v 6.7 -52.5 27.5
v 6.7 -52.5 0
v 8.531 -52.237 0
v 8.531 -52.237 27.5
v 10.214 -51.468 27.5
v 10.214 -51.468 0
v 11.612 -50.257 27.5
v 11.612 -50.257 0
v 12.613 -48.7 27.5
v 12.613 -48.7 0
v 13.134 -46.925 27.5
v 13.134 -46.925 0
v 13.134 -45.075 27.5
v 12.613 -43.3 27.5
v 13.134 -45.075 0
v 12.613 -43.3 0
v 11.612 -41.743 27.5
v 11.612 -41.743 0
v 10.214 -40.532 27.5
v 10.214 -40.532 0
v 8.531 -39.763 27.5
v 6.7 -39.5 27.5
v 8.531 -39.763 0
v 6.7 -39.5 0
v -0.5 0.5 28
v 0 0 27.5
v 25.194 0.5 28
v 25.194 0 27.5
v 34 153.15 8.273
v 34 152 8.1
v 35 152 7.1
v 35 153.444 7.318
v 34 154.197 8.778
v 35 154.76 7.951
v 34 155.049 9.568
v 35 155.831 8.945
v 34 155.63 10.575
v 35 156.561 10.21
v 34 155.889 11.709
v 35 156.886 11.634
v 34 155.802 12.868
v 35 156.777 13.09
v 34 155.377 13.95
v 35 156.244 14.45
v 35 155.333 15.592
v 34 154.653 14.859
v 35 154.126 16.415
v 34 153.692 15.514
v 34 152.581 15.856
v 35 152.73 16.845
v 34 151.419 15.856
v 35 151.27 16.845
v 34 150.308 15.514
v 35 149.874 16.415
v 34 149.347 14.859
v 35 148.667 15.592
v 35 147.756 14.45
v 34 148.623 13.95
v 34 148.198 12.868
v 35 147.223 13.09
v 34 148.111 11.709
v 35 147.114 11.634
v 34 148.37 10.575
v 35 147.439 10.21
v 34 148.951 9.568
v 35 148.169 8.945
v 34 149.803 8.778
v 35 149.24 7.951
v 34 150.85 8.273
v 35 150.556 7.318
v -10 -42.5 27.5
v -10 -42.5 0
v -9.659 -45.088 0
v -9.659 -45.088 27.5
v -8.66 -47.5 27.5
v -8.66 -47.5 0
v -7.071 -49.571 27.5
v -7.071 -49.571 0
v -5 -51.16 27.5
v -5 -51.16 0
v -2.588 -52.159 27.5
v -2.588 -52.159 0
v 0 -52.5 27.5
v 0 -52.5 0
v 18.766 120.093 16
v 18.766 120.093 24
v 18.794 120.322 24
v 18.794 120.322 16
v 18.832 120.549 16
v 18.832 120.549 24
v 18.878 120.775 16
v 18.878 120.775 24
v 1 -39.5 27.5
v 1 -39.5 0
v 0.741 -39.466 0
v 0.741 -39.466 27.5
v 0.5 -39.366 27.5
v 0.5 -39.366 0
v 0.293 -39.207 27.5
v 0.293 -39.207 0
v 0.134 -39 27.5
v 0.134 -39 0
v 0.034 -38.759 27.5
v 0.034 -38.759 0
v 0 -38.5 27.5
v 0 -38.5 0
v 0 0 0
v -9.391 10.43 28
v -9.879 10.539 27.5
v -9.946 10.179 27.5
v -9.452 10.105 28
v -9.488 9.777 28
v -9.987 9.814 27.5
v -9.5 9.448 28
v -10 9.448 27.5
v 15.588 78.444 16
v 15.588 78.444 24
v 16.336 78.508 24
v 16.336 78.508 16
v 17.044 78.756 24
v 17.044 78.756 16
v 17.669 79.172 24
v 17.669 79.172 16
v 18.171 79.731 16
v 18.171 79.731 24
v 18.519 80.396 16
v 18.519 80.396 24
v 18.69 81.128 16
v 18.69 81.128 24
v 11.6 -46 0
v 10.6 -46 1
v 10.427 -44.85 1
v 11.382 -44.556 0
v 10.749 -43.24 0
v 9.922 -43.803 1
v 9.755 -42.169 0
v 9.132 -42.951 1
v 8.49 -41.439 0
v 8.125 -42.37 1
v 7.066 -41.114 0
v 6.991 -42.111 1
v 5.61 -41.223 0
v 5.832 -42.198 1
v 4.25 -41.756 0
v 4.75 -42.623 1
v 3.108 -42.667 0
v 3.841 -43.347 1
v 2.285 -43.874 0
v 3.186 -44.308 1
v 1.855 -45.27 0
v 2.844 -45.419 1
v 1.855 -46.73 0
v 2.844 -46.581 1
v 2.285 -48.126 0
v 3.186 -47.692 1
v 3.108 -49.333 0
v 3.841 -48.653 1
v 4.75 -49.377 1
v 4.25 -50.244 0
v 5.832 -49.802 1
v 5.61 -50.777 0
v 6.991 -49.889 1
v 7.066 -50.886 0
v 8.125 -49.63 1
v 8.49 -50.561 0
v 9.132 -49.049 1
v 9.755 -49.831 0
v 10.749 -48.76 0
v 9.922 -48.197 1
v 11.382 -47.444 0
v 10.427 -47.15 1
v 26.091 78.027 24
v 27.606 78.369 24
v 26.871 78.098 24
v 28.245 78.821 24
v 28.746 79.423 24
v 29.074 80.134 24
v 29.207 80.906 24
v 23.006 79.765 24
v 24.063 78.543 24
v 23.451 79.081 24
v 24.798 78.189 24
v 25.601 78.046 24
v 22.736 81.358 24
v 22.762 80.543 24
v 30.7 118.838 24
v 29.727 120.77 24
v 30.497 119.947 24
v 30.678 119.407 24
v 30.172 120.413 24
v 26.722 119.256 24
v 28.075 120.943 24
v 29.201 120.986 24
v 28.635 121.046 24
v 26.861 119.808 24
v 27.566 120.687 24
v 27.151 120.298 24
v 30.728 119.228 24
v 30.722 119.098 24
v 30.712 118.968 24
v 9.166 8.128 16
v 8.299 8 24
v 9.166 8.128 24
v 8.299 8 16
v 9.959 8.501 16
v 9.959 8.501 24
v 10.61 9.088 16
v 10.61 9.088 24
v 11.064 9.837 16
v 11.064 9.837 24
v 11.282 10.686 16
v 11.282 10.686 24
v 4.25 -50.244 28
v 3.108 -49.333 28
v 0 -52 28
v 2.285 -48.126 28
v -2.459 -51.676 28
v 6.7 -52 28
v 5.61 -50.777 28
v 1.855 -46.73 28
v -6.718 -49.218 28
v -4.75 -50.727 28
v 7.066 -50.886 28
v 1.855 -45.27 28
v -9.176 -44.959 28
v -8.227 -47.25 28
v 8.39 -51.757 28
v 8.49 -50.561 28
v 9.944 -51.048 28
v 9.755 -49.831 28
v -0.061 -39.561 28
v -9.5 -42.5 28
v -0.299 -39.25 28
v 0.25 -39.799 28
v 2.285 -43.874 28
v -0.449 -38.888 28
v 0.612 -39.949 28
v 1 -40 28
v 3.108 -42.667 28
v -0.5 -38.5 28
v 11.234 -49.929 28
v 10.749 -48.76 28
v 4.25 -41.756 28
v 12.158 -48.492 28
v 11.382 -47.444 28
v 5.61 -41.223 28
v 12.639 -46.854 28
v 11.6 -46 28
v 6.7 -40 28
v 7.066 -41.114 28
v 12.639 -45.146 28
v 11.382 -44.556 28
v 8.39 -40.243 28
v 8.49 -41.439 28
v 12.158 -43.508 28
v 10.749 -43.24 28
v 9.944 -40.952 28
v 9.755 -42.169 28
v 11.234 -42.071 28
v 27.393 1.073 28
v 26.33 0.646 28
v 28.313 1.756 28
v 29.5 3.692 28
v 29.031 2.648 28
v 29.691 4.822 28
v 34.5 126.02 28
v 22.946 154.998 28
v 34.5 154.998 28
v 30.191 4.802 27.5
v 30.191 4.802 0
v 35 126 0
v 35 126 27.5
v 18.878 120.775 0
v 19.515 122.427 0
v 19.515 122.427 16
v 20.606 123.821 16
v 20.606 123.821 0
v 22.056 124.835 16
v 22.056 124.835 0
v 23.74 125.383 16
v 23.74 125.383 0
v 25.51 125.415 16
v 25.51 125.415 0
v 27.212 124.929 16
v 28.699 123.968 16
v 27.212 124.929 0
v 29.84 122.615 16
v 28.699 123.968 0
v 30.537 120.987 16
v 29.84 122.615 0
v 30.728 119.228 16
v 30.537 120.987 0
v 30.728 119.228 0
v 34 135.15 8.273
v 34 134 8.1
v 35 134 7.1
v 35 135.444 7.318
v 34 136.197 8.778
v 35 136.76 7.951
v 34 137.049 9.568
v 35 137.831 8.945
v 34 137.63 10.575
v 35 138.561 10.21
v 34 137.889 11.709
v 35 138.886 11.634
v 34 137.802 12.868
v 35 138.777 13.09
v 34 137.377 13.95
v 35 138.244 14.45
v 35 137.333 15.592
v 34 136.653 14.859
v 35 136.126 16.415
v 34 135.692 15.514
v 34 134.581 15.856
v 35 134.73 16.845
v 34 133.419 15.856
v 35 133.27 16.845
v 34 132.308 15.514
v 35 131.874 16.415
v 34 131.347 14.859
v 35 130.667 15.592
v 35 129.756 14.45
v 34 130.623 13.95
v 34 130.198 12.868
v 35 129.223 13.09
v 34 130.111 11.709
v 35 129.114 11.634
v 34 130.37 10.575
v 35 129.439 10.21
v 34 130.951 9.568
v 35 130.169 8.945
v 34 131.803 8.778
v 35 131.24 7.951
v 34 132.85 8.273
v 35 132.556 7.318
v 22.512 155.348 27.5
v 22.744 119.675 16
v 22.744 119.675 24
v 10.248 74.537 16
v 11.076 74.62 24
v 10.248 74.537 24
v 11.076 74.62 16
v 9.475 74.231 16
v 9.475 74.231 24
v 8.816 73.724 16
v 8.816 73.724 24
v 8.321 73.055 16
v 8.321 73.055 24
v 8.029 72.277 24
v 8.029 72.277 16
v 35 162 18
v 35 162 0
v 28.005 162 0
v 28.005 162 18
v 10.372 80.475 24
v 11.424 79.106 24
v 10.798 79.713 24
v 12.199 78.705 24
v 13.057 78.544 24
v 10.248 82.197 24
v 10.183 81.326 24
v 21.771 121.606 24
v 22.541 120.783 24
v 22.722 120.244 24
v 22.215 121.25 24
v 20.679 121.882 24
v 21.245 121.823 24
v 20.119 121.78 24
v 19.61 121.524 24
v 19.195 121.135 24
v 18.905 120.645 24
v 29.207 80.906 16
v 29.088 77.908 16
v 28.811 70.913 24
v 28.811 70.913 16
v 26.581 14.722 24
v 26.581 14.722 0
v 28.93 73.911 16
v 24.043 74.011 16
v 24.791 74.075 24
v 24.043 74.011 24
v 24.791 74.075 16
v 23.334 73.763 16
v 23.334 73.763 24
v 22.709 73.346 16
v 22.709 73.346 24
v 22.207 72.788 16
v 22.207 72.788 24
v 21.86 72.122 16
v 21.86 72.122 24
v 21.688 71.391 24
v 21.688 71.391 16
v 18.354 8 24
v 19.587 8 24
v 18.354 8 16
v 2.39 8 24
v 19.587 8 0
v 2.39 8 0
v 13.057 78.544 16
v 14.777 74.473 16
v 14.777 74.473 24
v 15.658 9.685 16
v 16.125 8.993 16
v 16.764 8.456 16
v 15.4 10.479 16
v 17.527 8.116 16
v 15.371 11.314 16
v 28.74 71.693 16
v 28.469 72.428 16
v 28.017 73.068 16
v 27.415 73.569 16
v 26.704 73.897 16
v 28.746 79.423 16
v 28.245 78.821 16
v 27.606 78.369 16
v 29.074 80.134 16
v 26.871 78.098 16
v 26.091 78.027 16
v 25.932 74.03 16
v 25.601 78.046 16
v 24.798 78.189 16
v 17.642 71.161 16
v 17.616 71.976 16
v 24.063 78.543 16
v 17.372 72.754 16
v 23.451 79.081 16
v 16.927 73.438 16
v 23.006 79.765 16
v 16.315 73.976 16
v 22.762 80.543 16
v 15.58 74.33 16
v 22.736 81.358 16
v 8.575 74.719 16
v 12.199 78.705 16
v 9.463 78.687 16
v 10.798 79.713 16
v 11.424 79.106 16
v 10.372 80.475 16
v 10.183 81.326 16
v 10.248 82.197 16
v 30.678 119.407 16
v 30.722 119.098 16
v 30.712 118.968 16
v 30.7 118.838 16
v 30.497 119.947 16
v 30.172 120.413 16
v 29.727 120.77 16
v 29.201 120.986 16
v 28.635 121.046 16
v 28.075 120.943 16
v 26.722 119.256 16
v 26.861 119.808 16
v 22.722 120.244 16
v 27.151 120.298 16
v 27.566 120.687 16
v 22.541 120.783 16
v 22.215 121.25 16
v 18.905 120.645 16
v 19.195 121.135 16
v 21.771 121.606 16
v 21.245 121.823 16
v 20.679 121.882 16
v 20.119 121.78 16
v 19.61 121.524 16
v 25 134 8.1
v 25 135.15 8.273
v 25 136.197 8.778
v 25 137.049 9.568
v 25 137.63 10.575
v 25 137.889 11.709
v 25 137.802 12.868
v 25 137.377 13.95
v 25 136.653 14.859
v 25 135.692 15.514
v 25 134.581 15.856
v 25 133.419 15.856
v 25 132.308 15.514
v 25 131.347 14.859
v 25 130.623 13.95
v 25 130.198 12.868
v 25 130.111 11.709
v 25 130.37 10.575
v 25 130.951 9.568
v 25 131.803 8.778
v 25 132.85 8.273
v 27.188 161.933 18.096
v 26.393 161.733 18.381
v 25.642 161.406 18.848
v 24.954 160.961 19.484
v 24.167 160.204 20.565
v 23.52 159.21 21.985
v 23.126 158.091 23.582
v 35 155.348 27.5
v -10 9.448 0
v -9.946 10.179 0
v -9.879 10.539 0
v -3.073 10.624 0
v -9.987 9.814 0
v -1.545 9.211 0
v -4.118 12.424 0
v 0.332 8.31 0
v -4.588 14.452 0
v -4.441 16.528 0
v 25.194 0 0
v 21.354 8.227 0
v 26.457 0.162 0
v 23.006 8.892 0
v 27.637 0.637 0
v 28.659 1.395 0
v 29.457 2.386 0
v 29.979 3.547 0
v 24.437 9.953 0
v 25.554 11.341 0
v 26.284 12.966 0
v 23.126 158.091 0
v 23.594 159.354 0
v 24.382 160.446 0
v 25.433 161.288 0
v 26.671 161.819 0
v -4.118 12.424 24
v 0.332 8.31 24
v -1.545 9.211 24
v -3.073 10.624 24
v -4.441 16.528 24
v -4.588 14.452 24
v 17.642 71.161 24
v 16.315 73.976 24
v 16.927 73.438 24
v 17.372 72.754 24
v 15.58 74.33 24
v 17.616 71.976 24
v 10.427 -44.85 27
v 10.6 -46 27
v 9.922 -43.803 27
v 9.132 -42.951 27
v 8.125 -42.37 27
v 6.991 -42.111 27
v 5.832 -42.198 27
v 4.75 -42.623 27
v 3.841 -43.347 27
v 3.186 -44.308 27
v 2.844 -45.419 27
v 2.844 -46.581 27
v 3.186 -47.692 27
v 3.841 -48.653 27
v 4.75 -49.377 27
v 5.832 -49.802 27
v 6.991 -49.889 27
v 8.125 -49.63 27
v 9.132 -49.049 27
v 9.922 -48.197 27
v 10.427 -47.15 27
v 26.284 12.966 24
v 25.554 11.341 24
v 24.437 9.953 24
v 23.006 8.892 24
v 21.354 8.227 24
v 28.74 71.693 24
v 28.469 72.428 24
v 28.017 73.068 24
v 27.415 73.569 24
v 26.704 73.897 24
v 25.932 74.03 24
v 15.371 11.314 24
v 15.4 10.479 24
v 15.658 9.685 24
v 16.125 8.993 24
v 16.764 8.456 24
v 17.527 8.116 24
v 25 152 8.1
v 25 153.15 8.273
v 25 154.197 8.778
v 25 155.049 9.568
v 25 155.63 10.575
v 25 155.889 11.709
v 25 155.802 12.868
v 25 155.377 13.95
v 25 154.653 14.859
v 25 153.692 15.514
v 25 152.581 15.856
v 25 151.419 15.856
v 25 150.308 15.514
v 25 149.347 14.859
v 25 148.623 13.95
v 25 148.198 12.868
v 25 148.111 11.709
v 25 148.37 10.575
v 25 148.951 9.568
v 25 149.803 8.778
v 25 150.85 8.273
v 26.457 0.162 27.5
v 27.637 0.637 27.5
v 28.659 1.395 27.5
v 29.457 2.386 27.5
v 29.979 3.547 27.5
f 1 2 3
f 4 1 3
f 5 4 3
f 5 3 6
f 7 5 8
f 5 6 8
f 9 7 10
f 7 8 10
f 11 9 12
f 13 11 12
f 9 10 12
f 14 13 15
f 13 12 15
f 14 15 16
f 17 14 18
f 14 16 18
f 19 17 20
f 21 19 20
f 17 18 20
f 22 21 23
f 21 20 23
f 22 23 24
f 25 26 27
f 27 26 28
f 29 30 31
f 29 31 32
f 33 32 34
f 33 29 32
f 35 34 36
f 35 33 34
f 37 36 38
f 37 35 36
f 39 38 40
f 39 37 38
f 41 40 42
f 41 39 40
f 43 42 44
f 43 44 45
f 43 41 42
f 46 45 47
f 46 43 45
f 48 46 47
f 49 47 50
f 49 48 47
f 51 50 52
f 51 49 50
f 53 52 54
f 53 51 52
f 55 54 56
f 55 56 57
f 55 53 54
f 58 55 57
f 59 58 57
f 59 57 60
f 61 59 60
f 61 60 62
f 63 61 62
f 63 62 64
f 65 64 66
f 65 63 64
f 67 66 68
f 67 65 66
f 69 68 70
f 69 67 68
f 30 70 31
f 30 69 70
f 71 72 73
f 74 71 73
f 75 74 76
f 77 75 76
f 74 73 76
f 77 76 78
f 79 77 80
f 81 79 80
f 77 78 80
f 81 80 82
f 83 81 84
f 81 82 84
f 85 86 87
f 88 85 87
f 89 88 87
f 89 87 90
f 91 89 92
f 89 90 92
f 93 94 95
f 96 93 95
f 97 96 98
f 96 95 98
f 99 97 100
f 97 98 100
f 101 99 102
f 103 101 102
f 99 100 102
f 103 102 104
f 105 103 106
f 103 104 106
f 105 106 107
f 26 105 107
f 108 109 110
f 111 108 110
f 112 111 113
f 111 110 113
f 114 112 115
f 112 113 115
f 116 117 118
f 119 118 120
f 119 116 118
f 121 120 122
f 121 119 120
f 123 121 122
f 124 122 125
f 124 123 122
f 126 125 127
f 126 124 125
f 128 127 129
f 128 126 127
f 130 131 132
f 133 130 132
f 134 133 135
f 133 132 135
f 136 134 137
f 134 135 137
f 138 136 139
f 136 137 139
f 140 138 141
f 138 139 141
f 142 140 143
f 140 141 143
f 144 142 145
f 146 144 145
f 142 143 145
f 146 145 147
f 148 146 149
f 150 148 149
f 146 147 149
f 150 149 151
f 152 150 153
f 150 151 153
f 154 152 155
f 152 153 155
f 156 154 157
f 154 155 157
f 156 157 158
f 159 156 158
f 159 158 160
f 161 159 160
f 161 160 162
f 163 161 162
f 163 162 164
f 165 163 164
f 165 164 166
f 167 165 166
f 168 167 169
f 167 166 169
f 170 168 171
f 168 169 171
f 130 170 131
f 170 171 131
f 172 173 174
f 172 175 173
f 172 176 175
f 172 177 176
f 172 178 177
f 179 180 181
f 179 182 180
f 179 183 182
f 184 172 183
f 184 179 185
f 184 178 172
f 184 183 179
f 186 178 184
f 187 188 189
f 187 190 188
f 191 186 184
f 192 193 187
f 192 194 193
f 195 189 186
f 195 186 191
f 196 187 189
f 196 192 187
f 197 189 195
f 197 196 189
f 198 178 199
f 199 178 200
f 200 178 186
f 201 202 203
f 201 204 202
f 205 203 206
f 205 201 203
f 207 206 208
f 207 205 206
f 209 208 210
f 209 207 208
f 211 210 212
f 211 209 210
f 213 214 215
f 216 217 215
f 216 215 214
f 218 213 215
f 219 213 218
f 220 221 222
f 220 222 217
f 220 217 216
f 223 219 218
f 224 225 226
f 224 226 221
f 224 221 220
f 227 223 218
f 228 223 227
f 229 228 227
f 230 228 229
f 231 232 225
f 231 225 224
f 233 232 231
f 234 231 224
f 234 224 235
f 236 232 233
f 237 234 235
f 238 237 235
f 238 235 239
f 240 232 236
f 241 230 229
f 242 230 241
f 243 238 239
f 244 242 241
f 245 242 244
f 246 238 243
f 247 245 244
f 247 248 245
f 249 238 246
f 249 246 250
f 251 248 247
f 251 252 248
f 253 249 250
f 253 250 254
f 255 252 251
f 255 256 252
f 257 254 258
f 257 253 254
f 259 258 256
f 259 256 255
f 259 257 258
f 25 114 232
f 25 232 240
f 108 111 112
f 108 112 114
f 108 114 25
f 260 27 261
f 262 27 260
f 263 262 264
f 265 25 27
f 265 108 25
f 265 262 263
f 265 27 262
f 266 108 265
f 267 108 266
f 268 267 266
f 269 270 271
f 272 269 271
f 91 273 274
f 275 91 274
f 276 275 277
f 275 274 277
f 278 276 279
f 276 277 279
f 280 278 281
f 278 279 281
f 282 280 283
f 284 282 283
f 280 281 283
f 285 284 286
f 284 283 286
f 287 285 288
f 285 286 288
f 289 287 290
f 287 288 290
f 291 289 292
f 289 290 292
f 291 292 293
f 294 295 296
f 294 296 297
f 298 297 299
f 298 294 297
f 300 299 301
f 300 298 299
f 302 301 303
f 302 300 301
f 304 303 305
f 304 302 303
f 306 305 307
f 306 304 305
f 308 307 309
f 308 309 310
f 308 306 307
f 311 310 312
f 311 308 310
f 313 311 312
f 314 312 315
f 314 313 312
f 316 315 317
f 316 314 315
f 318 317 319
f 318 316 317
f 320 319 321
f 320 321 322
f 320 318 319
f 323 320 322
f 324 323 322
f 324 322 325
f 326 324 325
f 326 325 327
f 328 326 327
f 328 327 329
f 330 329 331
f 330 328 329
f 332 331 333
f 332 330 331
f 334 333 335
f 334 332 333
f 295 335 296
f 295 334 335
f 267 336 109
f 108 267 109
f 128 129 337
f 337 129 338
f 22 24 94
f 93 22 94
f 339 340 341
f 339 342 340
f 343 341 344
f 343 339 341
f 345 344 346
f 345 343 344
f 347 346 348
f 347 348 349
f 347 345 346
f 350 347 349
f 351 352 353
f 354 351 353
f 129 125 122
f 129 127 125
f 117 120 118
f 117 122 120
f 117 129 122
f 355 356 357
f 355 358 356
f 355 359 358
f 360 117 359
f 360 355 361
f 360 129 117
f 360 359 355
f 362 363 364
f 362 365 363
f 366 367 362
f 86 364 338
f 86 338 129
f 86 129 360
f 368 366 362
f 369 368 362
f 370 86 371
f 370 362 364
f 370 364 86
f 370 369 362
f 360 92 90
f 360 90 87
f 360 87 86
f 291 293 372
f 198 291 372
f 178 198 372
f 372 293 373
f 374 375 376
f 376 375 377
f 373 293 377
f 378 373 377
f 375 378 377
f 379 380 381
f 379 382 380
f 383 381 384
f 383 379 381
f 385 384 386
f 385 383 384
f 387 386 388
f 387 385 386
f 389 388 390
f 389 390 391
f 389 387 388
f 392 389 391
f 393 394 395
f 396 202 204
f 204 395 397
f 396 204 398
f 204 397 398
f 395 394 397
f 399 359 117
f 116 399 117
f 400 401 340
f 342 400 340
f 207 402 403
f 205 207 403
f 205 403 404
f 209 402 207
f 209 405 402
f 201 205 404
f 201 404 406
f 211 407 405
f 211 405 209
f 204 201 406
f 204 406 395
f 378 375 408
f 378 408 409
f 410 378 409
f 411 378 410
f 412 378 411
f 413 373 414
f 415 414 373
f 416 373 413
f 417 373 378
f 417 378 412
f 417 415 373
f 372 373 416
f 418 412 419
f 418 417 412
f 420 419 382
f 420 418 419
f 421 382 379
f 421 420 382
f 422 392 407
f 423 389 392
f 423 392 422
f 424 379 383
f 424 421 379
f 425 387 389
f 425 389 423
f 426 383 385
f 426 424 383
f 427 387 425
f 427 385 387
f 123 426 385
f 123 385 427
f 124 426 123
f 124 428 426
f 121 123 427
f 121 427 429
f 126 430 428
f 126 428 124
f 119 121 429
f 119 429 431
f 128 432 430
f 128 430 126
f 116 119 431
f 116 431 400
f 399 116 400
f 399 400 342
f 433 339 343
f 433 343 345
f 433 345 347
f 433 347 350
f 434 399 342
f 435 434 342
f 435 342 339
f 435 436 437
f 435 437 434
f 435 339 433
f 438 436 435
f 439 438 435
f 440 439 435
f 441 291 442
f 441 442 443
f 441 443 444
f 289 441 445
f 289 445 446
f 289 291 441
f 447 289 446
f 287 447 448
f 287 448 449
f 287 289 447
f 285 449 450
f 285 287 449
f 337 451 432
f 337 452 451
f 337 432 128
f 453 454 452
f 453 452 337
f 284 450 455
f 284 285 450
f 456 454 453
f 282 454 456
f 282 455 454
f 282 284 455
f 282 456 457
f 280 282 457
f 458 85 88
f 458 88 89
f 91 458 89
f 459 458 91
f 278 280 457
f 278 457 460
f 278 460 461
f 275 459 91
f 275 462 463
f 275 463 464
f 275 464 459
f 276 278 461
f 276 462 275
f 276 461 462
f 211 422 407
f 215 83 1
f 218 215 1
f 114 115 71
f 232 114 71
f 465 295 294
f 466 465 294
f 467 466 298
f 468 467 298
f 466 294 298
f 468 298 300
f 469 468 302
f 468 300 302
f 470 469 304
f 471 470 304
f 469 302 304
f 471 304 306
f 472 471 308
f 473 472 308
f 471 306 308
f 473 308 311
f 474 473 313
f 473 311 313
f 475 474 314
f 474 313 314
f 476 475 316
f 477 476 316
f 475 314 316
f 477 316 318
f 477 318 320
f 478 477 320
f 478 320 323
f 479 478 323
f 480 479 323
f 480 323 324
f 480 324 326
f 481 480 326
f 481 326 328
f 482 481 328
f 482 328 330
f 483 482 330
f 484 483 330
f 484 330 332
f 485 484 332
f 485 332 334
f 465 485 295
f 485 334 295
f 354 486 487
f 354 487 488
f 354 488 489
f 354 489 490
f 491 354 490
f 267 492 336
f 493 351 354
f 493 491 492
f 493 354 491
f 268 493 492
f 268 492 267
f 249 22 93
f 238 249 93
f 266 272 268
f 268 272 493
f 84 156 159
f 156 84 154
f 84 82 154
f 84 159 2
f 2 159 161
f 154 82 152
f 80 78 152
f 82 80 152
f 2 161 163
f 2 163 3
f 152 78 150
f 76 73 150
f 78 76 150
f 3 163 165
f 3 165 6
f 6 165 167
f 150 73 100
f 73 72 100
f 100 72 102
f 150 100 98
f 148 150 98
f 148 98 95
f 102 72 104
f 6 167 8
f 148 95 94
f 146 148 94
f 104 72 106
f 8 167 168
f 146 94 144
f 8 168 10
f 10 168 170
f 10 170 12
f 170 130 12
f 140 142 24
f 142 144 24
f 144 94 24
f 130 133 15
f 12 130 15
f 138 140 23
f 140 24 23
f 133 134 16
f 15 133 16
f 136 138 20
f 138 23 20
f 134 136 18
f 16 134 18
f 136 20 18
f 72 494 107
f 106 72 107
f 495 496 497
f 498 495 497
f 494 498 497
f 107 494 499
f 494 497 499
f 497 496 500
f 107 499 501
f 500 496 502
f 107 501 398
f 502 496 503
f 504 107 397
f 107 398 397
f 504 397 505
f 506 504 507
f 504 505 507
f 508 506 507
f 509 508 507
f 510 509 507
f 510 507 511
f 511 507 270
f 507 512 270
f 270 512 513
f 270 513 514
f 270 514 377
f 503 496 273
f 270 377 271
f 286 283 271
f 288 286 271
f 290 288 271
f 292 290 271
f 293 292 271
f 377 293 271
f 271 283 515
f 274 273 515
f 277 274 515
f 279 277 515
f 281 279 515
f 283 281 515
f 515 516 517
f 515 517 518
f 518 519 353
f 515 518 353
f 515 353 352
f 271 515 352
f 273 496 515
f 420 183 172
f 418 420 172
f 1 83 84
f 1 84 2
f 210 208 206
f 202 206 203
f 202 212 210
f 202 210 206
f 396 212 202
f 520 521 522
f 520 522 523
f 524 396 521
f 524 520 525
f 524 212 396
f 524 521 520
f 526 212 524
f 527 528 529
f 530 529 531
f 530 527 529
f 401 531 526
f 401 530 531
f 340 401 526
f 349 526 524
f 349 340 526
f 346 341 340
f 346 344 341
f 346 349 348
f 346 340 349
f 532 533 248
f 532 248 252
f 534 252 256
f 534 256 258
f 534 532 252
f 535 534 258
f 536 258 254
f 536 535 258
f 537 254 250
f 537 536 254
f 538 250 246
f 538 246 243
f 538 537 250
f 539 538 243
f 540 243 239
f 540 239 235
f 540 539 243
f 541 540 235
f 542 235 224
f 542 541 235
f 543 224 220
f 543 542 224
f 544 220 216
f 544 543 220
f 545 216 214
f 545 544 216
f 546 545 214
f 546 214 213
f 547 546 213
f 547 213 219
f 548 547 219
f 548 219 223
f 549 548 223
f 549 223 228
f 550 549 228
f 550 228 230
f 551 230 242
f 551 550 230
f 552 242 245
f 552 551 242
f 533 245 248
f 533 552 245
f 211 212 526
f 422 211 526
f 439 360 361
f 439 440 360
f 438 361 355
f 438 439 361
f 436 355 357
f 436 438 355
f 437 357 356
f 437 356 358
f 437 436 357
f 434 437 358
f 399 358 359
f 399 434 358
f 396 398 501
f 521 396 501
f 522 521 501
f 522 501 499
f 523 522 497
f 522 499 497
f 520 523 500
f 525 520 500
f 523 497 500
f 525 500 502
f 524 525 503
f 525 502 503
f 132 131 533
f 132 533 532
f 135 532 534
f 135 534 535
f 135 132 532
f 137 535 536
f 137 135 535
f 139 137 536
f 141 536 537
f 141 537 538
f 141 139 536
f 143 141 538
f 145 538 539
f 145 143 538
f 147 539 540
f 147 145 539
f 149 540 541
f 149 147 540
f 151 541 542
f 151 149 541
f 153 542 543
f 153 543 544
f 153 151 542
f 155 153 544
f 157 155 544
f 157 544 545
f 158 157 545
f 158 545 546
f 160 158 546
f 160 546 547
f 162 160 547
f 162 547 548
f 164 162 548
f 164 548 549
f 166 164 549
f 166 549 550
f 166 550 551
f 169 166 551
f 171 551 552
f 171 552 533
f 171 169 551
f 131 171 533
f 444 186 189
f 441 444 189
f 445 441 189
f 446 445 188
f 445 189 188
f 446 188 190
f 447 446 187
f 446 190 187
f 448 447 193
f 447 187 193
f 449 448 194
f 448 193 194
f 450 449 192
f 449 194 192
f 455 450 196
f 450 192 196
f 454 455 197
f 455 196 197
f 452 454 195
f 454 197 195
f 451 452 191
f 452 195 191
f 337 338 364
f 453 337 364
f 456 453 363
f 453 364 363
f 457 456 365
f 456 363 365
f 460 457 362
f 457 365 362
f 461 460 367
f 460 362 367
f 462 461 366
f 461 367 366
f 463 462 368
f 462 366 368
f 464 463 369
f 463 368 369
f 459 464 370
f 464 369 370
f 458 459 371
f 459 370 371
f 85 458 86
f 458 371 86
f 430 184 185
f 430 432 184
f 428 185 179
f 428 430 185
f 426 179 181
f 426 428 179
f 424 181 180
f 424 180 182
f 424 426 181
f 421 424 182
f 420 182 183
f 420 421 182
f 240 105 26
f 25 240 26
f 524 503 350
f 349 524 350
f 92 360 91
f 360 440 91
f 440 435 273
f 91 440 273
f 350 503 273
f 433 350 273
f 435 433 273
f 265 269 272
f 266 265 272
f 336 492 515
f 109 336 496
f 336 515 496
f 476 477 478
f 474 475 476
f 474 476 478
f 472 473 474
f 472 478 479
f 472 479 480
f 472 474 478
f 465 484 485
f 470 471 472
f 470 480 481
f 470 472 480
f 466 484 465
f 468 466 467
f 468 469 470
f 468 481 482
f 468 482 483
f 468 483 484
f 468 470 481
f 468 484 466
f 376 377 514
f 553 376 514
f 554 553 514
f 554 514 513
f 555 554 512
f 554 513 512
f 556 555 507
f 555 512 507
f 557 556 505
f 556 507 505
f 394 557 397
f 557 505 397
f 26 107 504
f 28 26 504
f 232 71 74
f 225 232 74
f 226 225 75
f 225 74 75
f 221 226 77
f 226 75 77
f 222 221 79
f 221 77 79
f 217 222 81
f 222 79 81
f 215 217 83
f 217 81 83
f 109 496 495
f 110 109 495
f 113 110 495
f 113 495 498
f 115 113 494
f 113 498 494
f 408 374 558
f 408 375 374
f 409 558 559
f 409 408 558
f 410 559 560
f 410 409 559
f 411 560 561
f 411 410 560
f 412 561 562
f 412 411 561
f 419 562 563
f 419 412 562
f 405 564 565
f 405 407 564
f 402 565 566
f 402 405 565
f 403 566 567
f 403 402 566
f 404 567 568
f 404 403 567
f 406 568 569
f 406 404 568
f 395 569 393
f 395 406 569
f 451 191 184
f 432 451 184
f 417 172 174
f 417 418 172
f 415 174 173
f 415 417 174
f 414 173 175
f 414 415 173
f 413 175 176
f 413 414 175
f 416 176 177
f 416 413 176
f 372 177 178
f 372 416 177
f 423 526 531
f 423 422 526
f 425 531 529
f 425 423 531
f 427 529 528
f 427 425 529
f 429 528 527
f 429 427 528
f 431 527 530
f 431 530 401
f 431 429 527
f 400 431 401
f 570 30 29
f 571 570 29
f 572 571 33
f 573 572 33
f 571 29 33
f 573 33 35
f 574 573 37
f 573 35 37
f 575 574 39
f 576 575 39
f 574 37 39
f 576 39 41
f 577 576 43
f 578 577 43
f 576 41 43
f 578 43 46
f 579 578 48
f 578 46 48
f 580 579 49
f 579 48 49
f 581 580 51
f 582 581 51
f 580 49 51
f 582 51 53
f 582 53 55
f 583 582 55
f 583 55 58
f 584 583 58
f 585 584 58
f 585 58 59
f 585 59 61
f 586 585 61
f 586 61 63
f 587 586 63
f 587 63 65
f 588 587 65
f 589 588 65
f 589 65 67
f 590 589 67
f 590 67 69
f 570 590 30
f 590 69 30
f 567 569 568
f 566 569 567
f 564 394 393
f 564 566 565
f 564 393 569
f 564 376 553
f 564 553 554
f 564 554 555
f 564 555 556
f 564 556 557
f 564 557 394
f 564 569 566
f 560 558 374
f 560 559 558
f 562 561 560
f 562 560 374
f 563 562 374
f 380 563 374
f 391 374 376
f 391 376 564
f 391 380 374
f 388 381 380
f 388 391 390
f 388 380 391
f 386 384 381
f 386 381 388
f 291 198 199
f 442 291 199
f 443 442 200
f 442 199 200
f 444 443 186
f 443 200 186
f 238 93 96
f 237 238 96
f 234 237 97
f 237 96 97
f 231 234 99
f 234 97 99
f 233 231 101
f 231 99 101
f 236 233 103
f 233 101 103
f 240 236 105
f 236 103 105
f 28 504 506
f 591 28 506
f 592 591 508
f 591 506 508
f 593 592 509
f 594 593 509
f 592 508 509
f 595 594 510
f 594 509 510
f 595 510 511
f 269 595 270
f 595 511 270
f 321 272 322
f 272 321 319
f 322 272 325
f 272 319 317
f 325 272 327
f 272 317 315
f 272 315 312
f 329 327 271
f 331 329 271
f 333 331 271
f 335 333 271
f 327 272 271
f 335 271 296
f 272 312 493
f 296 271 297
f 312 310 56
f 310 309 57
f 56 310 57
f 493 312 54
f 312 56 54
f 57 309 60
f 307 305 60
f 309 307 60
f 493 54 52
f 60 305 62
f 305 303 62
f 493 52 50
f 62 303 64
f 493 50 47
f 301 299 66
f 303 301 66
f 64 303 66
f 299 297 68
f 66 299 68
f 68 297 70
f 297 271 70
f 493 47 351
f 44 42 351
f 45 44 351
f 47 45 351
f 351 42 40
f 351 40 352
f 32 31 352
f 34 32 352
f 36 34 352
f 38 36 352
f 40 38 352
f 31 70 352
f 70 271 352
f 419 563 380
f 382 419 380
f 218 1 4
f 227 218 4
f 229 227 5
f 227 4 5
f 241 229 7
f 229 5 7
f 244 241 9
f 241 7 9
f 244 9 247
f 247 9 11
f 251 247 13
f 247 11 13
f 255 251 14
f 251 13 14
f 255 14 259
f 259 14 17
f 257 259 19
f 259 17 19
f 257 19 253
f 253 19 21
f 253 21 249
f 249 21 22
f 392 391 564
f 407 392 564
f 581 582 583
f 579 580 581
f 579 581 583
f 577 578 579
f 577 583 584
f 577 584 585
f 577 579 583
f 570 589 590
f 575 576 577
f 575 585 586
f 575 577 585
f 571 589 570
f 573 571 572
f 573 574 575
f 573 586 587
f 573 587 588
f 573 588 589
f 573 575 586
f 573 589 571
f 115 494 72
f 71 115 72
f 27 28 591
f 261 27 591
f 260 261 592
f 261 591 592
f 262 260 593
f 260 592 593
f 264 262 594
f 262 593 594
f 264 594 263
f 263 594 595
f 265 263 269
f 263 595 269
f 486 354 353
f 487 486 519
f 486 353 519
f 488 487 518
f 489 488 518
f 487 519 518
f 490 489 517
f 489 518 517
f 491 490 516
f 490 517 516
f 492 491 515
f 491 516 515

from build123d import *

# Parameters (mm, degrees)
SKETCH1_R           = 3.9
BOSS_EXTRUDE1_DEPTH = 28
SKETCH4_R           = 3.9
CUT_EXTRUDE2_DEPTH  = 10
CUT_EXTRUDE3_DEPTH  = 24
CHAMFER1_SIZE       = 1
CUT_EXTRUDE4_DEPTH  = 46
BOSS_EXTRUDE2_DEPTH = 8
FILLET1_R           = 3
CHAMFER2_SIZE       = 0.5


with BuildPart() as part:
    # Sketch1 → Boss-Extrude1 (new body)
    with BuildSketch(Plane.XY):
        with BuildLine():
            Line((6.7, -39.5), (1, -39.5))
            ThreePointArc((1, -39.5), (0.292893219, -39.207106781), (0, -38.5))
            Line((0, -38.5), (0, 0))
            Line((0, 0), (25.194477487, 0))
            ThreePointArc((25.194477487, 0), (28.659208118, 1.395053169), (30.190545371, 4.801743338))
            Line((30.190545371, 4.801743338), (35, 126))
            Line((35, 126), (35, 162))
            Line((35, 162), (28.005138809, 162))
            ThreePointArc((28.005138809, 162), (24.87921862, 160.902386831), (23.125718898, 158.091449191))
            Line((23.125718898, 158.091449191), (-9.879419911, 10.539063929))
            ThreePointArc((-9.879419911, 10.539063929), (-9.969763553, 9.996659567), (-10, 9.447614738))
            Line((-10, 9.447614738), (-10, -42.5))
            ThreePointArc((-10, -42.5), (-7.071067812, -49.571067812), (0, -52.5))
            Line((0, -52.5), (6.7, -52.5))
            ThreePointArc((6.7, -52.5), (13.2, -46), (6.7, -39.5))
        make_face()
        with Locations((6.7, -46)):
            Circle(SKETCH1_R, mode=Mode.SUBTRACT)
    extrude(amount=BOSS_EXTRUDE1_DEPTH)

    # Sketch4 → Cut-Extrude2 (cut)
    with BuildSketch(Plane(origin=(35, 0, 0), x_dir=(0, 0, -1), z_dir=(1, 0, 0))):
        with Locations((-12, 152)):
            Circle(SKETCH4_R)
        with Locations((-12, 134)):
            Circle(SKETCH4_R)
    extrude(amount=-CUT_EXTRUDE2_DEPTH, mode=Mode.SUBTRACT)

    # Sketch5 → Cut-Extrude3 (cut)
    with BuildSketch(Plane.XY):
        with BuildLine():
            Line((-4.440935128, 16.528028867), (18.877520205, 120.775240942))
            ThreePointArc((18.877520205, 120.775240942), (25.509806245, 125.414980777), (30.728105558, 119.227593919))
            Line((30.728105558, 119.227593919), (26.581075667, 14.722440673))
            ThreePointArc((26.581075667, 14.722440673), (24.437203514, 9.953074436), (19.58658063, 8))
            Line((19.58658063, 8), (2.390252747, 8))
            ThreePointArc((2.390252747, 8), (-3.073088816, 10.623711736), (-4.440935128, 16.528028867))
        make_face()
    extrude(amount=CUT_EXTRUDE3_DEPTH, mode=Mode.SUBTRACT)

    # Chamfer1
    chamfer1_edges = [part.edges().sort_by_distance(p)[0] for p in [
        (2.8, -46, 0),
        (2.8, -46, 28),
        (35, 152, 15.9),
        (35, 134, 15.9),
    ]]
    chamfer(chamfer1_edges, length=CHAMFER1_SIZE)

    # Sketch6 → Cut-Extrude4 (cut, through all)
    with BuildSketch(Plane(origin=(35, 0, 0), x_dir=(0, 0, -1), z_dir=(1, 0, 0))):
        Polygon((-18, 162), (-28, 154.997924618), (-28, 162), align=None)
    extrude(amount=-CUT_EXTRUDE4_DEPTH, mode=Mode.SUBTRACT)

    # Sketch7 → Boss-Extrude2 (add)
    with BuildSketch(Plane(origin=(0, 0, 24), x_dir=(-1, 0, 0), z_dir=(0, 0, -1))):
        with BuildLine():
            Line((-26.7218562, 119.256333807), (-22.401525887, 78.173226899))
            Line((-22.401525887, 78.173226899), (-29.088434109, 77.907873398))
            Line((-29.088434109, 77.907873398), (-28.929828779, 73.911019091))
            Line((-28.929828779, 73.911019091), (-21.982301269, 74.186714627))
            Line((-21.982301269, 74.186714627), (-15.022056754, 8))
            Line((-15.022056754, 8), (-11, 8))
            Line((-11, 8), (-17.976958991, 74.345656781))
            Line((-17.976958991, 74.345656781), (-8.575406865, 74.718734246))
            Line((-8.575406865, 74.718734246), (-9.462969579, 78.686661673))
            Line((-9.462969579, 78.686661673), (-18.396183609, 78.332169052))
            Line((-18.396183609, 78.332169052), (-22.743791996, 119.67467002))
            ThreePointArc((-22.743791996, 119.67467002), (-20.963928, 121.872870229), (-18.765727791, 120.093006233))
            ThreePointArc((-18.765727791, 120.093006233), (-25.360328417, 125.43259822), (-30.699920404, 118.837997594))
            ThreePointArc((-30.699920404, 118.837997594), (-28.920056409, 121.036197803), (-26.7218562, 119.256333807))
        make_face()
    extrude(amount=BOSS_EXTRUDE2_DEPTH)

    # Fillet1
    fillet1_edges = [part.edges().sort_by_distance(p)[0] for p in [
        (21.982301269, 74.186714627, 20),
        (15.022056754, 8, 20),
        (11, 8, 20),
        (17.976958991, 74.345656781, 20),
        (8.575406865, 74.718734246, 20),
        (9.462969579, 78.686661673, 20),
        (18.396183609, 78.332169052, 20),
        (22.401525887, 78.173226899, 20),
        (29.088434109, 77.907873398, 20),
        (28.929828779, 73.911019091, 20),
    ]]
    fillet(fillet1_edges, radius=FILLET1_R)

    # Chamfer2
    chamfer2_edges = [part.edges().sort_by_distance(p)[0] for p in [
        (32.595272685, 65.400871669, 28),
        (35, 140.498962309, 28),
        (-9.969763553, 9.996659567, 28),
        (-10, -16.526192631, 28),
        (-7.071067812, -49.571067812, 28),
        (3.35, -52.5, 28),
        (13.2, -46, 28),
        (12.597238744, 0, 28),
        (3.85, -39.5, 28),
        (0.292893219, -39.207106781, 28),
        (0, -19.25, 28),
        (28.659208118, 1.395053169, 28),
        (6.277163193, 82.768494273, 28),
    ]]
    chamfer(chamfer2_edges, length=CHAMFER2_SIZE)


solid = part.part
